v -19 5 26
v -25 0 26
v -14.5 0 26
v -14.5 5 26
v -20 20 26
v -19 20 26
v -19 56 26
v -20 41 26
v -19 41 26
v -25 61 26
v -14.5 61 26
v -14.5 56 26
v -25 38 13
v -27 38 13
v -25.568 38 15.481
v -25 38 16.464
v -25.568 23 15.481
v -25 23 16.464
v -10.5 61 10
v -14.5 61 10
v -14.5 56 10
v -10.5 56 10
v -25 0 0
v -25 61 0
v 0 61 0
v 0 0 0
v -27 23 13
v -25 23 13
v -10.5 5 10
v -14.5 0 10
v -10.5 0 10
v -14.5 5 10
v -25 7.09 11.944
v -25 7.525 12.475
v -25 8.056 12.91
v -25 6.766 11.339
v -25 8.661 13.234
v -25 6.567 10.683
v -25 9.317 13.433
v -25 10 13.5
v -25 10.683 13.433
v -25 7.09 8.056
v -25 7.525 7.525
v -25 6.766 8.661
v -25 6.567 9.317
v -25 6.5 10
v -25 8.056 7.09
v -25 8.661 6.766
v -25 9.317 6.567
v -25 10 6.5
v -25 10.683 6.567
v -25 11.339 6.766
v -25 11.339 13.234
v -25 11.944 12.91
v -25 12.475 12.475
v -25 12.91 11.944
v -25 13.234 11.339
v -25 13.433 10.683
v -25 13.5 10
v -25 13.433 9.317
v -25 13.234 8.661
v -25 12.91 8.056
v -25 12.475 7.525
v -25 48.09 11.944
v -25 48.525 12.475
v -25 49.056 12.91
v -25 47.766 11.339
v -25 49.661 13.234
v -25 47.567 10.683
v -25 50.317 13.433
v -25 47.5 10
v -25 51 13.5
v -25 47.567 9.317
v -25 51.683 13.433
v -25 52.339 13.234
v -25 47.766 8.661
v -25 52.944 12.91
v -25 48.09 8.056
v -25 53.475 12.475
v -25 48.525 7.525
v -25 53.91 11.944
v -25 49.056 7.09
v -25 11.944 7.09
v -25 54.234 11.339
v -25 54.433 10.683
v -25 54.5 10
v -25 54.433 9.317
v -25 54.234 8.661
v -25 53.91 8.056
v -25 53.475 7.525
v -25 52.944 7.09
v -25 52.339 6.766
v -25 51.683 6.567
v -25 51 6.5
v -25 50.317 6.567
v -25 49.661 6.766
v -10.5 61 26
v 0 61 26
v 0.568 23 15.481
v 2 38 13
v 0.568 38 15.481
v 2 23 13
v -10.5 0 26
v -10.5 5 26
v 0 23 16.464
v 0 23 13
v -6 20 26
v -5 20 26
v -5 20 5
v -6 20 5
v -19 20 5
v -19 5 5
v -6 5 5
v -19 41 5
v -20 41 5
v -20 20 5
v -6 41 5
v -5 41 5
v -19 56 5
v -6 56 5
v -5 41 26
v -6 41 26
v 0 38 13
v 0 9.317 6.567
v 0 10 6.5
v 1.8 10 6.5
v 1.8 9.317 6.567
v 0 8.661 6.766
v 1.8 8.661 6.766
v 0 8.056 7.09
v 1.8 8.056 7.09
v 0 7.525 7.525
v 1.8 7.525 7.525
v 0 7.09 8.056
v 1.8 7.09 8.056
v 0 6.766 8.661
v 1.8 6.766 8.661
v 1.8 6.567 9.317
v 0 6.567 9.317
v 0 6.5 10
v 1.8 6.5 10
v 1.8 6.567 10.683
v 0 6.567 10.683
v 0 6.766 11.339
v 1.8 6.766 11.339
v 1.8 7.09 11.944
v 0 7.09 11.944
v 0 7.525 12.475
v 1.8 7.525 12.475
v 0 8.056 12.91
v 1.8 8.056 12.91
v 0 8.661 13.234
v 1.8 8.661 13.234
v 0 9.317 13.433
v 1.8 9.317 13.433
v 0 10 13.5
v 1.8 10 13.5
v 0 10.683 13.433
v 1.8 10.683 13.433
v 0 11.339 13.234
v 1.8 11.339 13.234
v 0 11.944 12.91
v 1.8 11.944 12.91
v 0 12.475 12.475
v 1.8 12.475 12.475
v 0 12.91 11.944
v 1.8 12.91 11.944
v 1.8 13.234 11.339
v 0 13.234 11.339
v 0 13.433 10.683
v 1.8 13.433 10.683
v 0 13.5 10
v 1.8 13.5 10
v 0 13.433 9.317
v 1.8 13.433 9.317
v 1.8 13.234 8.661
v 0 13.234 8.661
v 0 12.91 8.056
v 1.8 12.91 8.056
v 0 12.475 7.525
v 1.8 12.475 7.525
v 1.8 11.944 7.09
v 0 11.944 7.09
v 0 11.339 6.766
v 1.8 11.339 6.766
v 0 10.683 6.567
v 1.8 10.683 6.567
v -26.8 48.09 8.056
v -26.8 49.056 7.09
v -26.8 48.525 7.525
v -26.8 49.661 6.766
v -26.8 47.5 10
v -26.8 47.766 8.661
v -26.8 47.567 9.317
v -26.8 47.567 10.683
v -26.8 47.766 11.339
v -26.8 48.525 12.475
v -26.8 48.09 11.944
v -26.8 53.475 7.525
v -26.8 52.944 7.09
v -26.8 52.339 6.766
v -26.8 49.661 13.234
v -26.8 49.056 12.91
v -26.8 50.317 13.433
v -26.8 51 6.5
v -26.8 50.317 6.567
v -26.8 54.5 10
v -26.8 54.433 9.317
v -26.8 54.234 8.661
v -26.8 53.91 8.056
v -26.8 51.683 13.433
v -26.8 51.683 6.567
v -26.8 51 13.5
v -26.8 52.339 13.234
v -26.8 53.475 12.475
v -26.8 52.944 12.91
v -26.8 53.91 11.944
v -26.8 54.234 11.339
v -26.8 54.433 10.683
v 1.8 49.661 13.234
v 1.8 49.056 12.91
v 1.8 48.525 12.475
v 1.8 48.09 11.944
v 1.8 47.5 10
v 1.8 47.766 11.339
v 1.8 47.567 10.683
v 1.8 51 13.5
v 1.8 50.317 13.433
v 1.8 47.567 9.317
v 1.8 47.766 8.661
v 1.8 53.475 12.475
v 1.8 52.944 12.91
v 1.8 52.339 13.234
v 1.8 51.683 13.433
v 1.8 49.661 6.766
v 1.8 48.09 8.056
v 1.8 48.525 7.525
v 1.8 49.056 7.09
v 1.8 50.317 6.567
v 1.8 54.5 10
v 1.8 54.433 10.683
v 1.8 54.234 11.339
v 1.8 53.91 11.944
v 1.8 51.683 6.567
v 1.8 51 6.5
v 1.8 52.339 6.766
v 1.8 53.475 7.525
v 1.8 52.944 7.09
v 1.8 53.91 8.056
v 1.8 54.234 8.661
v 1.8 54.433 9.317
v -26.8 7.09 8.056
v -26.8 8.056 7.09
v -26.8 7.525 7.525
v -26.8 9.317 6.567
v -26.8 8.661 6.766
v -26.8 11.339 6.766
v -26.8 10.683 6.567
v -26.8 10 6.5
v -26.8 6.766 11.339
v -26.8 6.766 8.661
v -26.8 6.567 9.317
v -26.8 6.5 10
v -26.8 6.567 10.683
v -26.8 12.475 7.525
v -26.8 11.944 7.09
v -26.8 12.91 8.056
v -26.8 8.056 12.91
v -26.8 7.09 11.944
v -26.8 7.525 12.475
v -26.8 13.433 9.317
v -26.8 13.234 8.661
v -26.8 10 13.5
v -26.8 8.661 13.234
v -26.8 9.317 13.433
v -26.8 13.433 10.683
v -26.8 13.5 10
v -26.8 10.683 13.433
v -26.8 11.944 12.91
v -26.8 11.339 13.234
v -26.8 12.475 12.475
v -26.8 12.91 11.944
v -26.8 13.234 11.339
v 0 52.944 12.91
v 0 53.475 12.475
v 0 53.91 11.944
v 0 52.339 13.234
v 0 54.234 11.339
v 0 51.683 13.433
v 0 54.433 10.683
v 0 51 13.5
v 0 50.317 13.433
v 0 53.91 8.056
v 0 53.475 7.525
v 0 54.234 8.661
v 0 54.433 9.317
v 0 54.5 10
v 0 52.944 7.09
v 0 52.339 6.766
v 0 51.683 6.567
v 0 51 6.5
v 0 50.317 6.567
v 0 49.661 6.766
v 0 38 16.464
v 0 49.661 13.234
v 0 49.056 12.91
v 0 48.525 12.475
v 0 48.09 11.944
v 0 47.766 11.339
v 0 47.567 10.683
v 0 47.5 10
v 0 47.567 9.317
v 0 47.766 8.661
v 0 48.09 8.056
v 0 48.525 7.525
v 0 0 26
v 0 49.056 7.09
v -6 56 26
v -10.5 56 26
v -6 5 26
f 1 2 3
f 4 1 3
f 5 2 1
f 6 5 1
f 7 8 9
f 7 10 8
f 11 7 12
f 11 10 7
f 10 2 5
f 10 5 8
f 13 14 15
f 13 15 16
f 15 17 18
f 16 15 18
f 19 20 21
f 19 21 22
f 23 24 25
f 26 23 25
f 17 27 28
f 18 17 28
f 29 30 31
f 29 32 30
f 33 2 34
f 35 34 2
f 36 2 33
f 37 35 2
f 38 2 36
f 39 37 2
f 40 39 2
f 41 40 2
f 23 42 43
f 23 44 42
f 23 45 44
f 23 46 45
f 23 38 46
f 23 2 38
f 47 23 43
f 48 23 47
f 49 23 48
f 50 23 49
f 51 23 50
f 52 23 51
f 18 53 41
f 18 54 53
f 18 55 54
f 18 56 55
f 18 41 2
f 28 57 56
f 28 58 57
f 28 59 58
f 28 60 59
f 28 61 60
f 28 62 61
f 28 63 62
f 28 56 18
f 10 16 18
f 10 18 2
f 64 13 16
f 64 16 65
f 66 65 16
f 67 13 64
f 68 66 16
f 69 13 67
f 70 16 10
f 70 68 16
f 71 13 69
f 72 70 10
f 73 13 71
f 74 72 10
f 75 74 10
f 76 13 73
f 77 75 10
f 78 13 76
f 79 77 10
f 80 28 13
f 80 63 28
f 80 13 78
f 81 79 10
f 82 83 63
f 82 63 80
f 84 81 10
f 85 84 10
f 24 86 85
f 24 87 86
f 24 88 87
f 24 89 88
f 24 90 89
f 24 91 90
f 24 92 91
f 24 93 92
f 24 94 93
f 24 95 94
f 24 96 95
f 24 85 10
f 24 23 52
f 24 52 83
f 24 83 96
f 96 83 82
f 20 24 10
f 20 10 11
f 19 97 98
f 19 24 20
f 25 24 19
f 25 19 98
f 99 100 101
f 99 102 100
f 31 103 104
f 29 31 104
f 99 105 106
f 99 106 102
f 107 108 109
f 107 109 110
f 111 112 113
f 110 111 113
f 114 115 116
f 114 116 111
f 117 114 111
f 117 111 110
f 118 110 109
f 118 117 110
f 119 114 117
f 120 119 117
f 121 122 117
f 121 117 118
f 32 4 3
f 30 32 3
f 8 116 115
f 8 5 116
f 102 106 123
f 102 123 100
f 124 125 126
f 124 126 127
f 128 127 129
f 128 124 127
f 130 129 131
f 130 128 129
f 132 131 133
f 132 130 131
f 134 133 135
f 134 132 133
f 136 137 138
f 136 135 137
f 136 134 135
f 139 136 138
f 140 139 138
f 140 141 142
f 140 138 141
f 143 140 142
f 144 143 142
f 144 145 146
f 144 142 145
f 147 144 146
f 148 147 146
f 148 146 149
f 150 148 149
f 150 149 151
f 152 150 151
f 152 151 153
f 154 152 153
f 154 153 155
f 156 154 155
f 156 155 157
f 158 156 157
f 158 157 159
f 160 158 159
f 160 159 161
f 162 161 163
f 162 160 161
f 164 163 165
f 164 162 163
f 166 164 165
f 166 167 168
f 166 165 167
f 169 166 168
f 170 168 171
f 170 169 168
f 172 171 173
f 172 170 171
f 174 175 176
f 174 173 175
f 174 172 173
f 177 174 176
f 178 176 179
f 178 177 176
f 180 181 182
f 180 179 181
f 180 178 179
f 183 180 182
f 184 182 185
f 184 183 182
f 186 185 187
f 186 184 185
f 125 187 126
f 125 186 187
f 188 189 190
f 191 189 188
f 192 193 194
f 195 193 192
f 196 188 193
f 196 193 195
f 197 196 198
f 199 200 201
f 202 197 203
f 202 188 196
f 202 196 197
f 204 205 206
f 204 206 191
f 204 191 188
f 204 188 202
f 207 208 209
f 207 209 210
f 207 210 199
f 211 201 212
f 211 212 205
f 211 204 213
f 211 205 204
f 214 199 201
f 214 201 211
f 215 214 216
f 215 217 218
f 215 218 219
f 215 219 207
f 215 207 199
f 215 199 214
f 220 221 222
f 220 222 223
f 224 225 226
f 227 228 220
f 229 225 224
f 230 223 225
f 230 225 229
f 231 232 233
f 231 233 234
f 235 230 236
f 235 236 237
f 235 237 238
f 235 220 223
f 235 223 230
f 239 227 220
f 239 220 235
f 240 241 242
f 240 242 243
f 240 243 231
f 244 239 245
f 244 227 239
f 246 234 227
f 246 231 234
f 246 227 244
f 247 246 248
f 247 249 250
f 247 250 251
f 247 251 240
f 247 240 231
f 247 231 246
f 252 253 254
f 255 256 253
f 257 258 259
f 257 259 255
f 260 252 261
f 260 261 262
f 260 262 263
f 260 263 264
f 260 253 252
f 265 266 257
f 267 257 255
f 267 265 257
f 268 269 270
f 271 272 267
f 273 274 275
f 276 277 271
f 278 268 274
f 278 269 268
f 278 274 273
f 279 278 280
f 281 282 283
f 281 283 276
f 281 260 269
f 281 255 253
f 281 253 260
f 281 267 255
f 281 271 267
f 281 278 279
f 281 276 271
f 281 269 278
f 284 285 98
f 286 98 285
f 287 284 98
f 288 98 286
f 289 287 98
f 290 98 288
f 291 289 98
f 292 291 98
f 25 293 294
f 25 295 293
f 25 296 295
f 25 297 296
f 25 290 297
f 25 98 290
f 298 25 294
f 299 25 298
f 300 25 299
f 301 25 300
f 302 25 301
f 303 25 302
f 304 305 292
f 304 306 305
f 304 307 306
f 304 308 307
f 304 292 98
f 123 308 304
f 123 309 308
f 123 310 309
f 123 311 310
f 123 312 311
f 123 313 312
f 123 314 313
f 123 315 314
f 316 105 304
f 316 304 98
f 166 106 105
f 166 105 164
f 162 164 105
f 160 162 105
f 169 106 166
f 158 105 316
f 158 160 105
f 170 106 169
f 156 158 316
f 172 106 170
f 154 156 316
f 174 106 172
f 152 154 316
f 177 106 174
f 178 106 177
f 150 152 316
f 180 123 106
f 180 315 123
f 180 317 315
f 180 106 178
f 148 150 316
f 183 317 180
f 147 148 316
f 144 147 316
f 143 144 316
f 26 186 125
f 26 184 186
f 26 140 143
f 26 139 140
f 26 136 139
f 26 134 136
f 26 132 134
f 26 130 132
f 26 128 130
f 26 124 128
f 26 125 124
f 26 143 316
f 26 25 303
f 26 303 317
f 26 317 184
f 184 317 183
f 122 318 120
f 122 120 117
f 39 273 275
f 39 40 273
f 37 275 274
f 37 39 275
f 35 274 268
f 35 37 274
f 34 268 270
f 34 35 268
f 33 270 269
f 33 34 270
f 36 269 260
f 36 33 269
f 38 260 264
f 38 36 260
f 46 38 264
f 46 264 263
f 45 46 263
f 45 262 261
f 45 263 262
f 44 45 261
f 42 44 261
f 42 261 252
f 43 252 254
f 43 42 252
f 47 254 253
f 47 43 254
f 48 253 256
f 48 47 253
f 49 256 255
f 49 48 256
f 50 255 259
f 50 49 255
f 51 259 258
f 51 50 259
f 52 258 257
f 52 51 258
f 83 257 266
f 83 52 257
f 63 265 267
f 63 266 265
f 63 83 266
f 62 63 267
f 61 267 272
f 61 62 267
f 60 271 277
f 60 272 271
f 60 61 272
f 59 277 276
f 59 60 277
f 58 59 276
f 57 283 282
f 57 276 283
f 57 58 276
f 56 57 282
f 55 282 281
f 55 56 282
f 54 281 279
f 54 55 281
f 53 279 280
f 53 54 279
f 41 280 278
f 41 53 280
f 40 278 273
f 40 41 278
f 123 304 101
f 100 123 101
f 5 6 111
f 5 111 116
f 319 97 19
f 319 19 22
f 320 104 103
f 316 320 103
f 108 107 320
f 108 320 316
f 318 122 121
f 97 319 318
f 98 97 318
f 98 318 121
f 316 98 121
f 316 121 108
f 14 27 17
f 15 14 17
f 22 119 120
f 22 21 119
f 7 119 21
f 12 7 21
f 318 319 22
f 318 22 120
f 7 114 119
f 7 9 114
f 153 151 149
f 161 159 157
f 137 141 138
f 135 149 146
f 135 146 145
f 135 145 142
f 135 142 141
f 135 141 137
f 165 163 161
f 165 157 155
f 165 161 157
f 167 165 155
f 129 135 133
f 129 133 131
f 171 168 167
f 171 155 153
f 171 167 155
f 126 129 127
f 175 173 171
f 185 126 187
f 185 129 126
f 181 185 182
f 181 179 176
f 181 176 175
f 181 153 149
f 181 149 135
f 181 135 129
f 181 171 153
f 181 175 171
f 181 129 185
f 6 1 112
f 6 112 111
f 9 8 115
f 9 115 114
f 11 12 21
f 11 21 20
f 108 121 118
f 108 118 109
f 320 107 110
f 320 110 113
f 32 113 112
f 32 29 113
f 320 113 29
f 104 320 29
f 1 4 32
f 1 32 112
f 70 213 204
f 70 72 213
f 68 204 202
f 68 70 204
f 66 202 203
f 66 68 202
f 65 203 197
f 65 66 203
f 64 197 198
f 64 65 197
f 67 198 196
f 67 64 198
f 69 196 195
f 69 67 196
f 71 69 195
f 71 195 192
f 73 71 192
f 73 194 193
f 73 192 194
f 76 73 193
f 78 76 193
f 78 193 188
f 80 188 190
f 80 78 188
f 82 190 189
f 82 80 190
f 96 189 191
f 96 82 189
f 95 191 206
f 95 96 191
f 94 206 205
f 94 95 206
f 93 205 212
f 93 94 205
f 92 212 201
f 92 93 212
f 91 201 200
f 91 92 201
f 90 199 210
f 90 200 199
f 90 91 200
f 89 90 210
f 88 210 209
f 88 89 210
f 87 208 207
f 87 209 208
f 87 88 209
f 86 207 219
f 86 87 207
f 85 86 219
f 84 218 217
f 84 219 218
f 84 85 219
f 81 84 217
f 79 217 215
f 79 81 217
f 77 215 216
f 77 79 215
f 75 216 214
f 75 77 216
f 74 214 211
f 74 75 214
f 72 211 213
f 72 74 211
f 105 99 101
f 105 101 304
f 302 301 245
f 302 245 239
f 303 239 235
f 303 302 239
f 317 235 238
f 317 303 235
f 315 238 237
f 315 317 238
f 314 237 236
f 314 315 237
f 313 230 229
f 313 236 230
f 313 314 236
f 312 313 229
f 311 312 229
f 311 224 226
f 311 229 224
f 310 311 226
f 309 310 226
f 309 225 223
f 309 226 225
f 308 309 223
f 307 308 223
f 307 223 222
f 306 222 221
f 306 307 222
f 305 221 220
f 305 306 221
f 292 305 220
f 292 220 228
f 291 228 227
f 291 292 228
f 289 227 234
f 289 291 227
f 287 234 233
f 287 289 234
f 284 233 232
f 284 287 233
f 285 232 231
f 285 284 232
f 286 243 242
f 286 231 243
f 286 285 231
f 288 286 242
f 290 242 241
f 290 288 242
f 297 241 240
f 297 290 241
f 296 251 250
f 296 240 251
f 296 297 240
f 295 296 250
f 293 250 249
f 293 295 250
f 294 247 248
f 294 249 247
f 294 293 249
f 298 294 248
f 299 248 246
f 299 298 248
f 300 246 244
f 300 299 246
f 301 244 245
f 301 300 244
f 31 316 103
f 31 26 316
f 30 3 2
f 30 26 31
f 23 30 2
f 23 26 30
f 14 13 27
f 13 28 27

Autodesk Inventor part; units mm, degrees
ref_plane "YZ Plane" through (0, 0, 0) normal (1, 0, 0) x (0, 1, 0)
ref_plane "XZ Plane" through (0, 0, 0) normal (0, 1, 0) x (-1, 0, 0)
ref_plane "XY Plane" through (0, 0, 0) normal (0, 0, 1) x (1, 0, 0)
sketch "Skizze1" plane through (0, 0, 0) normal (0, 0, 1) x (1, 0, 0)
  line L0 (0, 0) -> (-25, 0)
  line L1 (-25, 0) -> (-25, 61)
  line L2 (-25, 61) -> (0, 61)
  line L3 (0, 61) -> (0, 0)
  dimension "d0" = 25
  dimension "d1" = 61
extrude "Extrusion1" add sketch "Skizze1" along normal blind 26
sketch "Skizze2" plane through (0, 0, 26) normal (0, 0, 1) x (1, 0, 0)
  line L0 (-6, 56) -> (-6, 41)
  line L1 (-19, 41) -> (-19, 56)
  line L2 (0, 61) -> (-25, 61)
  line L3 (-25, 61) -> (-25, 0)
  line L4 (0, 0) -> (0, 61)
  line L5 (-6, 20) -> (-6, 5)
  line L6 (-19, 5) -> (-19, 20)
  line L7 (-25, 0) -> (0, 0)
  line L8 (-20, 41) -> (-19, 41)
  line L9 (-5, 41) -> (-5, 20)
  line L10 (-5, 20) -> (-6, 20)
  line L11 (-20, 20) -> (-20, 41)
  line L12 (-6, 41) -> (-5, 41)
  line L13 (-19, 20) -> (-20, 20)
  line L14 (-6, 5) -> (-10.5, 5)
  line L15 (-14.5, 5) -> (-19, 5)
  line L16 (-19, 56) -> (-14.5, 56)
  line L17 (-10.5, 56) -> (-6, 56)
  line L18 (-14.5, 61) -> (-10.5, 61)
  line L19 (-14.5, 0) -> (-10.5, 0)
  line L20 (-14.5, 56) -> (-10.5, 56)
  line L21 (-14.5, 5) -> (-10.5, 5)
  dimension "d4" = 25
  dimension "d5" = 13
  dimension "d6" = 6
  dimension "d7" = 13
  dimension "d8" = 5
  dimension "d9" = 5
  dimension "d10" = 21
extrude "Extrusion2" cut sketch "Skizze2" against normal blind 21 contours L0 L12 L9 L10 L5 L14 L21 L15 L6 L13 L11 L8 L1 L16 L20 L17
sketch "Skizze3" plane through (0, 0, 26) normal (0, 0, 1) x (1, 0, 0)
  line L0 (0, 61) -> (-25, 61)
  line L1 (-19, 56) -> (-6, 56)
  line L2 (-14.5, 61) -> (-10.5, 61)
  line L3 (-10.5, 61) -> (-10.5, 56)
  line L4 (-14.5, 56) -> (-14.5, 61)
  line L5 (-25, 61) -> (-25, 0)
  line L6 (0, 0) -> (0, 61)
  line L7 (-30.0841, 30.5) -> (8.1464, 30.5)
  line L8 (-14.5, 56) -> (-10.5, 56)
  line L9 (-14.5, 5) -> (-14.5, 0)
  line L10 (-10.5, 0) -> (-14.5, 0)
  line L11 (-10.5, 0) -> (-10.5, 5)
  line L12 (-14.5, 5) -> (-10.5, 5)
  point P0 (-19, 5)
  point P1 (-6, 5)
  dimension "d13" = 10.5
  dimension "d14" = 10.5
  dimension "d15" = 4
extrude "Extrusion3" cut sketch "Skizze3" against normal blind 16 contours L3 L1 L4 L0 | L12 L11 L10 L9
ref_plane "Arbeitsebene1" through (-25, 30.5, 0) normal (0, 1, 0) x (1, 0, 0)
sketch "Skizze4" plane through (-25, 30.5, 0) normal (0, 1, 0) x (1, 0, 0)
  line L0 (14.5, -10) -> (10.5, -10) projected
  line L1 (0, 0) -> (0, -26) projected
  line L2 (0, -13) -> (-2, -13)
  line L3 (-2, -13) -> (-0.5676, -15.481)
  line L4 (-0.5676, -15.481) -> (0, -16.4641)
  line L5 (0, -13) -> (0, -16.4641)
  line L6 (25, -13) -> (27, -13)
  line L7 (27, -13) -> (25.5676, -15.481)
  line L8 (25.5676, -15.481) -> (25, -16.4641)
  line L9 (25, -13) -> (25, -16.4641)
  line L10 (0, 0) -> (25, 0) projected
  line L11 (25, -26) -> (14.5, -26) projected
  dimension "d18" = 2
  dimension "d19" = 60
  dimension "d22" = 13
  dimension "d23" = 9.5359
  dimension "d24" = 26
extrude "Extrusion4" add sketch "Skizze4" along normal mid plane 15
sketch "Skizze6" plane through (0, 0, 0) normal (1, 0, 0) x (0, 0, -1)
  line L0 (-5, 41) -> (-5, 56) projected
  circle A0 centre (-10, 10) radius 3.5
  line L1 (0, 61) -> (0, 0) projected
  circle A1 centre (-10, 51) radius 3.5
  line L2 (0, 61) -> (-26, 61) projected
  line L3 (0, 0) -> (-26, 0) projected
  dimension "d26" = 7
  dimension "d28" = 7
  dimension "d29" = 10
  dimension "d30" = 10
  dimension "d31" = 10
  dimension "d32" = 10
sketch "Skizze7" plane through (-25, 0, 0) normal (-1, 0, 0) x (0, 0, 1)
  circle A0 centre (10, 51) radius 3.5
  circle A1 centre (10, 10) radius 3.5
  line L0 (0, 61) -> (26, 61) projected
  line L1 (0, 0) -> (0, 61) projected
  line L2 (0, 0) -> (26, 0) projected
  dimension "d33" = 7
  dimension "d34" = 7
  dimension "d35" = 10
  dimension "d36" = 10
  dimension "d37" = 10
  dimension "d38" = 10
extrude "Extrusion5" add sketch "Skizze6" along normal blind 1.8
extrude "Extrusion6" add sketch "Skizze7" along normal blind 1.8
properties part number "valve_body"
